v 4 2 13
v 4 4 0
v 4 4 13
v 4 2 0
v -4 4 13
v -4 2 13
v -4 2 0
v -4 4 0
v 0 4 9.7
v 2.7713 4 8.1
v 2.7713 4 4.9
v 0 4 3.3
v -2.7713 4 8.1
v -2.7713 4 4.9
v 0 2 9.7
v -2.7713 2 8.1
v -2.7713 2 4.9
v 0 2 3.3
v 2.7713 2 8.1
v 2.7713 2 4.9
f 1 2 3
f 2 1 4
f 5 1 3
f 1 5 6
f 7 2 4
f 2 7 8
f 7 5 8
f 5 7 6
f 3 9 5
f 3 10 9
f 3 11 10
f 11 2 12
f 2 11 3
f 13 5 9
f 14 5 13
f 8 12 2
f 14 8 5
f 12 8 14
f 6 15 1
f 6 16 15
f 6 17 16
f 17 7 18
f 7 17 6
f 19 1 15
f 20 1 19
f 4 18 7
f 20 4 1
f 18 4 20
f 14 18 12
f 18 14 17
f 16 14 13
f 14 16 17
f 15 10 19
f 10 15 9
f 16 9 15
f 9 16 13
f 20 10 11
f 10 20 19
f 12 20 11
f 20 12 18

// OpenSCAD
// file: params_basic_components.scad
// Author: Mihai Oltean, www.tcreate.org, mihai.oltean@gmail.com
// More details: jenny5.org
// Source: github.com/jenny5-robot
// MIT License
//--------------------------------------------------------------

spring_length = 20;

smooth_rod_8_radius = 4;
smooth_rod_10_radius = 5;
smooth_rod_12_radius = 6;

tolerance = 0.1;
display_tolerance = 1;

overlap_tolerance = 0.01;


wall_thick_1 = 1;
wall_thick_2 = 2;
wall_thick_3 = 3;
wall_thick_4 = 4;
wall_thick_5 = 5;
wall_thick_5_5 = 5.5;
wall_thick_6 = 6;
wall_thick_7 = 7;
wall_thick_8 = 8;
wall_thick_9 = 9;
wall_thick_10 = 10;
wall_thick_12 = 10;

wrench_radius = 11;

ghidaj_radius = 4;
ghidaj_radius_12 = 6;

canal_diameter = 8.22;
canal_height = 2.2;

filament_radius = 0.9;

bowden_tube_radius = 2.5;

m3_tolerance = 0.1;

latura_mare_L = 40;
latura_mica_L = 15;
grosime_perete_L = 3;

latura_L_50x50 = 50;
latura_L_40x40 = 40;

latura_U_50x50 = 50;
latura_U_40x40 = 40;


tolerance_z = [0, 0, tolerance];
tolerance_x = [tolerance, 0, 0];
tolerance_y = [0, tolerance, 0];

display_tolerance_z = [0, 0, display_tolerance];
display_tolerance_x = [display_tolerance, 0, 0];
display_tolerance_y = [0, display_tolerance, 0];

display_tolerance_xz = [display_tolerance, 0, display_tolerance];
display_tolerance_xy = [display_tolerance, display_tolerance, 0];
display_tolerance_yz = [0, display_tolerance, display_tolerance];

display_tolerance_xyz = [display_tolerance, display_tolerance, display_tolerance];
// file: config.scad
// Author: Mihai Oltean, www.tcreate.org, mihai.oltean@gmail.com
// More details: jenny5.org
// Source: github.com/jenny5-robot
// MIT License
//--------------------------------------------------------------

aluminium_color = "Silver";
screw_color = "LightSlateGray";
frame_color = aluminium_color;
shaft_color = "Silver";
plastic_color = "LimeGreen";
pulley_color = "DarkSlateGray";
steel_color = "LightSlateGray";
// file: tolerance.scad
// Author: Mihai Oltean, https://mihaioltean.github.io, mihai.oltean@gmail.com
// More details: jenny5.org
// Source: github.com/jenny5-robot
// MIT License
//--------------------------------------------------------------

tolerance = 0.1;
display_tolerance = 1;

overlap_tolerance = 0.01;

tolerance_z = [0, 0, tolerance];
tolerance_x = [tolerance, 0, 0];
tolerance_y = [0, tolerance, 0];

display_tolerance_z = [0, 0, display_tolerance];
display_tolerance_x = [display_tolerance, 0, 0];
display_tolerance_y = [0, display_tolerance, 0];

display_tolerance_xz = [display_tolerance, 0, display_tolerance];
display_tolerance_xy = [display_tolerance, display_tolerance, 0];
display_tolerance_yz = [0, display_tolerance, display_tolerance];

display_tolerance_xyz = [display_tolerance, display_tolerance, display_tolerance];
// file: params_screws_nuts_washers.scad
// Author: Mihai Oltean, www.tcreate.org, mihai.oltean@gmail.com
// More details: jenny5.org
// Source: github.com/jenny5-robot
// MIT License
//--------------------------------------------------------------


m2_screw_radius = 1;
m2_nut_radius = 2.2;
m2_nut_height = 1.6;
m2_nut_thick = m2_nut_height;

m3_screw_radius = 1.5;
m3_nut_radius = 3.1;
m3_nut_height = 2.3;
m3_nut_thick = m3_nut_height;
m3_autolock_nut_thick = 4.2;

m4_screw_radius = 2;
m4_nut_radius = 4;
m4_auto_lock_nut_height = 5;
m4_nut_height = 3.25;
m4_nut_thick = 3.25;

m5_screw_radius = 2.5;
m5_nut_radius = 4.6;
m5_nut_height = 4;

m6_screw_radius = 3;
m6_nut_radius = 5.65;
m6_nut_thick = 5;
m6_nut_slim_thick = 3;
m6_autolock_nut_thick = 6;
m6_long_nut_thick = 9;

m8_screw_head_height = 5.7;
m8_screw_radius = 3.9;
m8_nut_small_width = 12.8;
m8_nut_radius = 7.3;
m8_slim_nut_small_width = 12.4;
m8_nut_thick = 6.5;
m8_nut_height = m8_nut_thick;
m8_slim_nut_height = 5.5;
m8_screw_head_radius = 6.5;
m8_autolock_nut_thick = 8;

m10_screw_radius = 5;
m10_nut_thick = 8;
m10_nut_radius = 9.8;

M12_screw_radius = 6;
M12_nut_thick = 8;
M12_nut_radius = 11;
M12_long_long_nut_thick = 36;
M12_long_nut_thick = 36;
M12_autolock_nut_thick = 14;

m10_long_nut_radius = 9.71;
m10_long_nut_height = 29.8;

m10_long_thick_nut_radius = 7.41;
m10_long_thick_nut_height = 30.4;

m12_plastic_nut_radius = 10.45;
m12_plastic_nut_height = 23.3;

tr12_3_nut_radius = 11;
tr12_3_nut_height = 18.1;

washer_5 = 0.97;

washer_4_12_radius = 6;
washer_4_12_external_radius = 6;
washer_4_12_thick = 1;
washer_4_thick = 1;
washer_4_12_internal_radius = 2.15;

washer_4_9_external_radius = 4.5;
washer_4_9_internal_radius = 2.15;
washer_4_9_thick = 1;

washer_6_thick = 1.7;
washer_8_thick = 1.5;
washer_5_thick = 1;

washer_10_height = 2;
washer_10_thick = 2;

washer_12_thick = 2;

washer_5_15_external_radius = 7.5;
washer_5_15_thick = 1;
washer_5_thick = 1;
washer_5_15_internal_radius = 2.65;
// file: params_pulleys.scad
// Author: Mihai Oltean, https://mihaioltean.github.io, mihai.oltean@gmail.com
// More details: https://jenny5.org, https://jenny5-robot.github.io/
// Source code: github.com/jenny5-robot
// MIT License
//--------------------------------------------------------------

pulley_40_radius = 19;
pulley_40_height = 16;

pulley_30_radius = 14;
pulley_30_height = 16;

pulley_18_radius = 7.2;
pulley_18_height = 14;


roata_cu_dinti_raza_flansa = 11.5;

roata_dintata_t2_5_30_dinti_height = 17;
roata_dintata_t2_5_30_dinti_raza_flansa = 14;

pulley_T5_6mm_thick = 14;

pulley_HTD_5m_thick = 13;
// main file
// Author: Mihai Oltean, https://mihaioltean.github.io, mihai.oltean@gmail.com
// More details: http://jenny5.org, https://jenny5-robot.github.io/
// Source code: github.com/jenny5-robot
// MIT License
//--------------------------------------------------------------


include <params_pulleys.scad>
use <pulleys.scad>
include <params_screws_nuts_washers.scad>
include <tolerance.scad>

//---------------------------------------------------------------------------
module motor_pulley_8mm_shaft()
{
  pulley_t_ht = 8;	// length of toothed part of pulley
  pulley_base_height = 1.5;
  difference(){      
      union(){
      rotate ([0, 0, 13.5]) 
          pulley_with_shaft("T5mm_pulley", 14, 0, 0, 10, 4, 0, 0);
        //pulley_with_shaft(51, 13, 0, 0, 8, 4, 0, 0);
          //pulley_with_shaft(57, 12, 0, 0, 8, 4, 0, 0);
          translate([-4, 3, 0]) cube([8, 2, 13]);
      }
     /*   
    // M3 screws
    translate ([0, 0, pulley_t_ht / 2 + pulley_base_height]) rotate ([-90, 0, 0]) cylinder (h = 40, r = m3_screw_radius, $fn = 25);
        
      dist_to_nut = 3;
    // M3 nut
    hull(){
            translate ([0, dist_to_nut - 1, pulley_t_ht / 2 + pulley_base_height]) rotate ([-90, 30, 0]) cylinder (h = m3_nut_thick + 0.2 + 1, r = m3_nut_radius + 0.1, $fn = 6);
        //   translate ([0, dist_to_nut, 9 + pulley_base_height]) rotate ([-90, 30, 0]) cylinder (h = m3_nut_thick + 0.2, r = m3_nut_radius + 0.1, $fn = 6);
    }
      */

  }
}
//---------------------------------------------------------------------------
module motor_pulley_6mm_shaft()
{
  pulley_t_ht = 10;	// length of toothed part of pulley
  pulley_base_height = 1.5;
  difference(){      
    //rotate ([0, 0, 10.8]) pulley_with_shaft(52, 14, 0, 0, 8, 4, 0, 0);
      union(){
        pulley_with_shaft("T5mm_pulley", 14, 0, 0, pulley_t_ht, 3, 0, 0);
        translate([-4, 2, 0]) cube([8, 2, pulley_t_ht + 2 * pulley_base_height]);
      }
    // M3 screws
    translate ([0, 0, pulley_t_ht / 2 + pulley_base_height]) rotate ([-90, 0, 0]) cylinder (h = 40, r = m3_screw_radius, $fn = 25);
        
    // M3 nut
    hull(){
            translate ([0, 2 - 1, pulley_t_ht / 2 + pulley_base_height]) rotate ([-90, 30, 0]) cylinder (h = m3_nut_thick + 0.2 + 1, r = m3_nut_radius + 0.1, $fn = 6);
       //    translate ([0, 5, 9 + pulley_base_height]) rotate ([-90, 30, 0]) cylinder (h = m3_nut_thick + 0.2, r = m3_nut_radius + 0.1, $fn = 6);
    }

  }
}
//---------------------------------------------------------------------------

//motor_pulley_8mm_shaft();

motor_pulley_6mm_shaft();
